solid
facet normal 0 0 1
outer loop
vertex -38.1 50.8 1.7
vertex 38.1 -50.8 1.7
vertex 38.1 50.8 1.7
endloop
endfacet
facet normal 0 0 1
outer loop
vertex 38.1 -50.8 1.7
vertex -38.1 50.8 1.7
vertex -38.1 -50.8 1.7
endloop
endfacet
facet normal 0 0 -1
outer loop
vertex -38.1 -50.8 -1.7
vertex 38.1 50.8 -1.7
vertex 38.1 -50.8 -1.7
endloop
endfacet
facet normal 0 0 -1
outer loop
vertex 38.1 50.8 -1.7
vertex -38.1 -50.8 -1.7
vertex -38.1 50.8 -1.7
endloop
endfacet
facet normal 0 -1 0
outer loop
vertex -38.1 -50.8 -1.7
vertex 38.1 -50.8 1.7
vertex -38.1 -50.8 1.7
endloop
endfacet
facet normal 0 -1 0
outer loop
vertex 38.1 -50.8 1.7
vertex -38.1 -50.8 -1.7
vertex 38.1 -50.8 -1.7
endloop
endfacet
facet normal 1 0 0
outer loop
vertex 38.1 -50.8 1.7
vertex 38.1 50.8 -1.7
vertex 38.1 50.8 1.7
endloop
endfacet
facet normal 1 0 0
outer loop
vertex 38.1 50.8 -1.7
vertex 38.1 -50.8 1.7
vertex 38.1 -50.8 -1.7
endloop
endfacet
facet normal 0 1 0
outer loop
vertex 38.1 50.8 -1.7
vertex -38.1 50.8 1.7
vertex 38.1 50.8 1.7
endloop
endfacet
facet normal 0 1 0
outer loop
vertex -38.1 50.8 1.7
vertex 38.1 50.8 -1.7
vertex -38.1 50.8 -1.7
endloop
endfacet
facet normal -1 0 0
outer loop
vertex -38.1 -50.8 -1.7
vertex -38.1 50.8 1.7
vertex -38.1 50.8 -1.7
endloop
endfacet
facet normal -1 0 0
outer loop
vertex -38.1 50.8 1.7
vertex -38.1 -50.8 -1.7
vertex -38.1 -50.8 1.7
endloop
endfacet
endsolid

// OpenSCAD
//Plate for maintaining orthogonality when measuring material sheets
length = 76.2;
width = 101.6;
height = 3.4;
cube([length,width,height], true);
